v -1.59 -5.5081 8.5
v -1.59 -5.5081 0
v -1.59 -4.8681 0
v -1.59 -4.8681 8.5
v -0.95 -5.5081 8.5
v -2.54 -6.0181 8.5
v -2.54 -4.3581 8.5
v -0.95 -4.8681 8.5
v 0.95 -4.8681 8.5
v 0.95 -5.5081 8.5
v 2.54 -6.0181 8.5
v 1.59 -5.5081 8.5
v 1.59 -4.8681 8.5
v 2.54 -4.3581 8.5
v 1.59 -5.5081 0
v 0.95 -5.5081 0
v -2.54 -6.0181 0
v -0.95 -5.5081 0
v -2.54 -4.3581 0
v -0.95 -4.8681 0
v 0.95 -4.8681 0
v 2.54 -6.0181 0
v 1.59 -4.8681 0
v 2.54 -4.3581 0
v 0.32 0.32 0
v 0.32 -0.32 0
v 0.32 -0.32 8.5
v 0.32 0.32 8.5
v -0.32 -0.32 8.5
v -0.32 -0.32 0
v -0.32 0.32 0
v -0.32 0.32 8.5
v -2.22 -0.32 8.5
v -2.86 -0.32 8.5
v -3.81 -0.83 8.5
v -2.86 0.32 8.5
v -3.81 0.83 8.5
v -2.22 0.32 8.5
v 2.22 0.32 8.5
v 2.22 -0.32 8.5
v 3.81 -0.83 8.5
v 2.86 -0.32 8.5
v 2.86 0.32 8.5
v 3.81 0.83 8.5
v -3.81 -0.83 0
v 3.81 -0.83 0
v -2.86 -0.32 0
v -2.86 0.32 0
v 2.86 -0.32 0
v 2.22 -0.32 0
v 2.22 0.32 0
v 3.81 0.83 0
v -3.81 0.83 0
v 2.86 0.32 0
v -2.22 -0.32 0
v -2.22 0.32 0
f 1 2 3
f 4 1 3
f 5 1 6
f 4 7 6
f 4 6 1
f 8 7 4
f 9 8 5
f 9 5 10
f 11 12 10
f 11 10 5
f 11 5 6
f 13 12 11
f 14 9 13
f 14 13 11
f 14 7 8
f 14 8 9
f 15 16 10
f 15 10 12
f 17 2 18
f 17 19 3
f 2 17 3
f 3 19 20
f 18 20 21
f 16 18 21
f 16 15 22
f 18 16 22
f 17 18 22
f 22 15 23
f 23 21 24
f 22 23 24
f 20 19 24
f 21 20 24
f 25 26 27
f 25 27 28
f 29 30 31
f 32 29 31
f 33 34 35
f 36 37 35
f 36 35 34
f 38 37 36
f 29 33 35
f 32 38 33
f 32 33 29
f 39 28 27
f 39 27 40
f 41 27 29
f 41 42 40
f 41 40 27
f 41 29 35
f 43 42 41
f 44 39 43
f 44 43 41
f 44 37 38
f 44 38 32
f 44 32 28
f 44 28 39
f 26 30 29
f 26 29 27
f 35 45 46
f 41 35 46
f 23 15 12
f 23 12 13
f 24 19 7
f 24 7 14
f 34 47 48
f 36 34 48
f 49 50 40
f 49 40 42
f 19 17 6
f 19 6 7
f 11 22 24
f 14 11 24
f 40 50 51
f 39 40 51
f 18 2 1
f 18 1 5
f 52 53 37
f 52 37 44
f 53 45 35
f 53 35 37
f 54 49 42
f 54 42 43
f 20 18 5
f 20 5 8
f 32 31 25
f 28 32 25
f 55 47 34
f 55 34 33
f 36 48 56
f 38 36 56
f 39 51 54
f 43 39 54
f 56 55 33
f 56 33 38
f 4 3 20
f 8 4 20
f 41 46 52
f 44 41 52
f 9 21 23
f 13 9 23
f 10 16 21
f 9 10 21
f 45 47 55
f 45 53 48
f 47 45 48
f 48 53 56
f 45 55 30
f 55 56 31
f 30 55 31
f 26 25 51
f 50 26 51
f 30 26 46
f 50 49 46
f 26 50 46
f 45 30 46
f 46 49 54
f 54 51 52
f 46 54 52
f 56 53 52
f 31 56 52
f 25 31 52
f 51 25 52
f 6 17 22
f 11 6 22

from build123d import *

# Parameters (mm, degrees)
F0_W     = 7.62
F0_H     = 1.66
F0_W_2   = 0.64
F0_H_2   = 0.64
F0_W_3   = 5.08
F1_DEPTH = 8.5


with BuildPart() as f1:
    # F0 (on Top) → F1 (new body)
    with BuildSketch(Plane.XY):
        Rectangle(F0_W, F0_H)
        with Locations((-2.54, 0)):
            Rectangle(F0_W_2, F0_H_2, mode=Mode.SUBTRACT)
        Rectangle(F0_W_2, F0_H_2, mode=Mode.SUBTRACT)
        with Locations((2.54, 0)):
            Rectangle(F0_W_2, F0_H_2, mode=Mode.SUBTRACT)
        with Locations((0, -5.188086)):
            Rectangle(F0_W_3, F0_H)
        with Locations((-1.27, -5.188086)):
            Rectangle(F0_W_2, F0_H_2, mode=Mode.SUBTRACT)
        with Locations((1.27, -5.188086)):
            Rectangle(F0_W_2, F0_H_2, mode=Mode.SUBTRACT)
    extrude(amount=F1_DEPTH)


solid = f1.part
